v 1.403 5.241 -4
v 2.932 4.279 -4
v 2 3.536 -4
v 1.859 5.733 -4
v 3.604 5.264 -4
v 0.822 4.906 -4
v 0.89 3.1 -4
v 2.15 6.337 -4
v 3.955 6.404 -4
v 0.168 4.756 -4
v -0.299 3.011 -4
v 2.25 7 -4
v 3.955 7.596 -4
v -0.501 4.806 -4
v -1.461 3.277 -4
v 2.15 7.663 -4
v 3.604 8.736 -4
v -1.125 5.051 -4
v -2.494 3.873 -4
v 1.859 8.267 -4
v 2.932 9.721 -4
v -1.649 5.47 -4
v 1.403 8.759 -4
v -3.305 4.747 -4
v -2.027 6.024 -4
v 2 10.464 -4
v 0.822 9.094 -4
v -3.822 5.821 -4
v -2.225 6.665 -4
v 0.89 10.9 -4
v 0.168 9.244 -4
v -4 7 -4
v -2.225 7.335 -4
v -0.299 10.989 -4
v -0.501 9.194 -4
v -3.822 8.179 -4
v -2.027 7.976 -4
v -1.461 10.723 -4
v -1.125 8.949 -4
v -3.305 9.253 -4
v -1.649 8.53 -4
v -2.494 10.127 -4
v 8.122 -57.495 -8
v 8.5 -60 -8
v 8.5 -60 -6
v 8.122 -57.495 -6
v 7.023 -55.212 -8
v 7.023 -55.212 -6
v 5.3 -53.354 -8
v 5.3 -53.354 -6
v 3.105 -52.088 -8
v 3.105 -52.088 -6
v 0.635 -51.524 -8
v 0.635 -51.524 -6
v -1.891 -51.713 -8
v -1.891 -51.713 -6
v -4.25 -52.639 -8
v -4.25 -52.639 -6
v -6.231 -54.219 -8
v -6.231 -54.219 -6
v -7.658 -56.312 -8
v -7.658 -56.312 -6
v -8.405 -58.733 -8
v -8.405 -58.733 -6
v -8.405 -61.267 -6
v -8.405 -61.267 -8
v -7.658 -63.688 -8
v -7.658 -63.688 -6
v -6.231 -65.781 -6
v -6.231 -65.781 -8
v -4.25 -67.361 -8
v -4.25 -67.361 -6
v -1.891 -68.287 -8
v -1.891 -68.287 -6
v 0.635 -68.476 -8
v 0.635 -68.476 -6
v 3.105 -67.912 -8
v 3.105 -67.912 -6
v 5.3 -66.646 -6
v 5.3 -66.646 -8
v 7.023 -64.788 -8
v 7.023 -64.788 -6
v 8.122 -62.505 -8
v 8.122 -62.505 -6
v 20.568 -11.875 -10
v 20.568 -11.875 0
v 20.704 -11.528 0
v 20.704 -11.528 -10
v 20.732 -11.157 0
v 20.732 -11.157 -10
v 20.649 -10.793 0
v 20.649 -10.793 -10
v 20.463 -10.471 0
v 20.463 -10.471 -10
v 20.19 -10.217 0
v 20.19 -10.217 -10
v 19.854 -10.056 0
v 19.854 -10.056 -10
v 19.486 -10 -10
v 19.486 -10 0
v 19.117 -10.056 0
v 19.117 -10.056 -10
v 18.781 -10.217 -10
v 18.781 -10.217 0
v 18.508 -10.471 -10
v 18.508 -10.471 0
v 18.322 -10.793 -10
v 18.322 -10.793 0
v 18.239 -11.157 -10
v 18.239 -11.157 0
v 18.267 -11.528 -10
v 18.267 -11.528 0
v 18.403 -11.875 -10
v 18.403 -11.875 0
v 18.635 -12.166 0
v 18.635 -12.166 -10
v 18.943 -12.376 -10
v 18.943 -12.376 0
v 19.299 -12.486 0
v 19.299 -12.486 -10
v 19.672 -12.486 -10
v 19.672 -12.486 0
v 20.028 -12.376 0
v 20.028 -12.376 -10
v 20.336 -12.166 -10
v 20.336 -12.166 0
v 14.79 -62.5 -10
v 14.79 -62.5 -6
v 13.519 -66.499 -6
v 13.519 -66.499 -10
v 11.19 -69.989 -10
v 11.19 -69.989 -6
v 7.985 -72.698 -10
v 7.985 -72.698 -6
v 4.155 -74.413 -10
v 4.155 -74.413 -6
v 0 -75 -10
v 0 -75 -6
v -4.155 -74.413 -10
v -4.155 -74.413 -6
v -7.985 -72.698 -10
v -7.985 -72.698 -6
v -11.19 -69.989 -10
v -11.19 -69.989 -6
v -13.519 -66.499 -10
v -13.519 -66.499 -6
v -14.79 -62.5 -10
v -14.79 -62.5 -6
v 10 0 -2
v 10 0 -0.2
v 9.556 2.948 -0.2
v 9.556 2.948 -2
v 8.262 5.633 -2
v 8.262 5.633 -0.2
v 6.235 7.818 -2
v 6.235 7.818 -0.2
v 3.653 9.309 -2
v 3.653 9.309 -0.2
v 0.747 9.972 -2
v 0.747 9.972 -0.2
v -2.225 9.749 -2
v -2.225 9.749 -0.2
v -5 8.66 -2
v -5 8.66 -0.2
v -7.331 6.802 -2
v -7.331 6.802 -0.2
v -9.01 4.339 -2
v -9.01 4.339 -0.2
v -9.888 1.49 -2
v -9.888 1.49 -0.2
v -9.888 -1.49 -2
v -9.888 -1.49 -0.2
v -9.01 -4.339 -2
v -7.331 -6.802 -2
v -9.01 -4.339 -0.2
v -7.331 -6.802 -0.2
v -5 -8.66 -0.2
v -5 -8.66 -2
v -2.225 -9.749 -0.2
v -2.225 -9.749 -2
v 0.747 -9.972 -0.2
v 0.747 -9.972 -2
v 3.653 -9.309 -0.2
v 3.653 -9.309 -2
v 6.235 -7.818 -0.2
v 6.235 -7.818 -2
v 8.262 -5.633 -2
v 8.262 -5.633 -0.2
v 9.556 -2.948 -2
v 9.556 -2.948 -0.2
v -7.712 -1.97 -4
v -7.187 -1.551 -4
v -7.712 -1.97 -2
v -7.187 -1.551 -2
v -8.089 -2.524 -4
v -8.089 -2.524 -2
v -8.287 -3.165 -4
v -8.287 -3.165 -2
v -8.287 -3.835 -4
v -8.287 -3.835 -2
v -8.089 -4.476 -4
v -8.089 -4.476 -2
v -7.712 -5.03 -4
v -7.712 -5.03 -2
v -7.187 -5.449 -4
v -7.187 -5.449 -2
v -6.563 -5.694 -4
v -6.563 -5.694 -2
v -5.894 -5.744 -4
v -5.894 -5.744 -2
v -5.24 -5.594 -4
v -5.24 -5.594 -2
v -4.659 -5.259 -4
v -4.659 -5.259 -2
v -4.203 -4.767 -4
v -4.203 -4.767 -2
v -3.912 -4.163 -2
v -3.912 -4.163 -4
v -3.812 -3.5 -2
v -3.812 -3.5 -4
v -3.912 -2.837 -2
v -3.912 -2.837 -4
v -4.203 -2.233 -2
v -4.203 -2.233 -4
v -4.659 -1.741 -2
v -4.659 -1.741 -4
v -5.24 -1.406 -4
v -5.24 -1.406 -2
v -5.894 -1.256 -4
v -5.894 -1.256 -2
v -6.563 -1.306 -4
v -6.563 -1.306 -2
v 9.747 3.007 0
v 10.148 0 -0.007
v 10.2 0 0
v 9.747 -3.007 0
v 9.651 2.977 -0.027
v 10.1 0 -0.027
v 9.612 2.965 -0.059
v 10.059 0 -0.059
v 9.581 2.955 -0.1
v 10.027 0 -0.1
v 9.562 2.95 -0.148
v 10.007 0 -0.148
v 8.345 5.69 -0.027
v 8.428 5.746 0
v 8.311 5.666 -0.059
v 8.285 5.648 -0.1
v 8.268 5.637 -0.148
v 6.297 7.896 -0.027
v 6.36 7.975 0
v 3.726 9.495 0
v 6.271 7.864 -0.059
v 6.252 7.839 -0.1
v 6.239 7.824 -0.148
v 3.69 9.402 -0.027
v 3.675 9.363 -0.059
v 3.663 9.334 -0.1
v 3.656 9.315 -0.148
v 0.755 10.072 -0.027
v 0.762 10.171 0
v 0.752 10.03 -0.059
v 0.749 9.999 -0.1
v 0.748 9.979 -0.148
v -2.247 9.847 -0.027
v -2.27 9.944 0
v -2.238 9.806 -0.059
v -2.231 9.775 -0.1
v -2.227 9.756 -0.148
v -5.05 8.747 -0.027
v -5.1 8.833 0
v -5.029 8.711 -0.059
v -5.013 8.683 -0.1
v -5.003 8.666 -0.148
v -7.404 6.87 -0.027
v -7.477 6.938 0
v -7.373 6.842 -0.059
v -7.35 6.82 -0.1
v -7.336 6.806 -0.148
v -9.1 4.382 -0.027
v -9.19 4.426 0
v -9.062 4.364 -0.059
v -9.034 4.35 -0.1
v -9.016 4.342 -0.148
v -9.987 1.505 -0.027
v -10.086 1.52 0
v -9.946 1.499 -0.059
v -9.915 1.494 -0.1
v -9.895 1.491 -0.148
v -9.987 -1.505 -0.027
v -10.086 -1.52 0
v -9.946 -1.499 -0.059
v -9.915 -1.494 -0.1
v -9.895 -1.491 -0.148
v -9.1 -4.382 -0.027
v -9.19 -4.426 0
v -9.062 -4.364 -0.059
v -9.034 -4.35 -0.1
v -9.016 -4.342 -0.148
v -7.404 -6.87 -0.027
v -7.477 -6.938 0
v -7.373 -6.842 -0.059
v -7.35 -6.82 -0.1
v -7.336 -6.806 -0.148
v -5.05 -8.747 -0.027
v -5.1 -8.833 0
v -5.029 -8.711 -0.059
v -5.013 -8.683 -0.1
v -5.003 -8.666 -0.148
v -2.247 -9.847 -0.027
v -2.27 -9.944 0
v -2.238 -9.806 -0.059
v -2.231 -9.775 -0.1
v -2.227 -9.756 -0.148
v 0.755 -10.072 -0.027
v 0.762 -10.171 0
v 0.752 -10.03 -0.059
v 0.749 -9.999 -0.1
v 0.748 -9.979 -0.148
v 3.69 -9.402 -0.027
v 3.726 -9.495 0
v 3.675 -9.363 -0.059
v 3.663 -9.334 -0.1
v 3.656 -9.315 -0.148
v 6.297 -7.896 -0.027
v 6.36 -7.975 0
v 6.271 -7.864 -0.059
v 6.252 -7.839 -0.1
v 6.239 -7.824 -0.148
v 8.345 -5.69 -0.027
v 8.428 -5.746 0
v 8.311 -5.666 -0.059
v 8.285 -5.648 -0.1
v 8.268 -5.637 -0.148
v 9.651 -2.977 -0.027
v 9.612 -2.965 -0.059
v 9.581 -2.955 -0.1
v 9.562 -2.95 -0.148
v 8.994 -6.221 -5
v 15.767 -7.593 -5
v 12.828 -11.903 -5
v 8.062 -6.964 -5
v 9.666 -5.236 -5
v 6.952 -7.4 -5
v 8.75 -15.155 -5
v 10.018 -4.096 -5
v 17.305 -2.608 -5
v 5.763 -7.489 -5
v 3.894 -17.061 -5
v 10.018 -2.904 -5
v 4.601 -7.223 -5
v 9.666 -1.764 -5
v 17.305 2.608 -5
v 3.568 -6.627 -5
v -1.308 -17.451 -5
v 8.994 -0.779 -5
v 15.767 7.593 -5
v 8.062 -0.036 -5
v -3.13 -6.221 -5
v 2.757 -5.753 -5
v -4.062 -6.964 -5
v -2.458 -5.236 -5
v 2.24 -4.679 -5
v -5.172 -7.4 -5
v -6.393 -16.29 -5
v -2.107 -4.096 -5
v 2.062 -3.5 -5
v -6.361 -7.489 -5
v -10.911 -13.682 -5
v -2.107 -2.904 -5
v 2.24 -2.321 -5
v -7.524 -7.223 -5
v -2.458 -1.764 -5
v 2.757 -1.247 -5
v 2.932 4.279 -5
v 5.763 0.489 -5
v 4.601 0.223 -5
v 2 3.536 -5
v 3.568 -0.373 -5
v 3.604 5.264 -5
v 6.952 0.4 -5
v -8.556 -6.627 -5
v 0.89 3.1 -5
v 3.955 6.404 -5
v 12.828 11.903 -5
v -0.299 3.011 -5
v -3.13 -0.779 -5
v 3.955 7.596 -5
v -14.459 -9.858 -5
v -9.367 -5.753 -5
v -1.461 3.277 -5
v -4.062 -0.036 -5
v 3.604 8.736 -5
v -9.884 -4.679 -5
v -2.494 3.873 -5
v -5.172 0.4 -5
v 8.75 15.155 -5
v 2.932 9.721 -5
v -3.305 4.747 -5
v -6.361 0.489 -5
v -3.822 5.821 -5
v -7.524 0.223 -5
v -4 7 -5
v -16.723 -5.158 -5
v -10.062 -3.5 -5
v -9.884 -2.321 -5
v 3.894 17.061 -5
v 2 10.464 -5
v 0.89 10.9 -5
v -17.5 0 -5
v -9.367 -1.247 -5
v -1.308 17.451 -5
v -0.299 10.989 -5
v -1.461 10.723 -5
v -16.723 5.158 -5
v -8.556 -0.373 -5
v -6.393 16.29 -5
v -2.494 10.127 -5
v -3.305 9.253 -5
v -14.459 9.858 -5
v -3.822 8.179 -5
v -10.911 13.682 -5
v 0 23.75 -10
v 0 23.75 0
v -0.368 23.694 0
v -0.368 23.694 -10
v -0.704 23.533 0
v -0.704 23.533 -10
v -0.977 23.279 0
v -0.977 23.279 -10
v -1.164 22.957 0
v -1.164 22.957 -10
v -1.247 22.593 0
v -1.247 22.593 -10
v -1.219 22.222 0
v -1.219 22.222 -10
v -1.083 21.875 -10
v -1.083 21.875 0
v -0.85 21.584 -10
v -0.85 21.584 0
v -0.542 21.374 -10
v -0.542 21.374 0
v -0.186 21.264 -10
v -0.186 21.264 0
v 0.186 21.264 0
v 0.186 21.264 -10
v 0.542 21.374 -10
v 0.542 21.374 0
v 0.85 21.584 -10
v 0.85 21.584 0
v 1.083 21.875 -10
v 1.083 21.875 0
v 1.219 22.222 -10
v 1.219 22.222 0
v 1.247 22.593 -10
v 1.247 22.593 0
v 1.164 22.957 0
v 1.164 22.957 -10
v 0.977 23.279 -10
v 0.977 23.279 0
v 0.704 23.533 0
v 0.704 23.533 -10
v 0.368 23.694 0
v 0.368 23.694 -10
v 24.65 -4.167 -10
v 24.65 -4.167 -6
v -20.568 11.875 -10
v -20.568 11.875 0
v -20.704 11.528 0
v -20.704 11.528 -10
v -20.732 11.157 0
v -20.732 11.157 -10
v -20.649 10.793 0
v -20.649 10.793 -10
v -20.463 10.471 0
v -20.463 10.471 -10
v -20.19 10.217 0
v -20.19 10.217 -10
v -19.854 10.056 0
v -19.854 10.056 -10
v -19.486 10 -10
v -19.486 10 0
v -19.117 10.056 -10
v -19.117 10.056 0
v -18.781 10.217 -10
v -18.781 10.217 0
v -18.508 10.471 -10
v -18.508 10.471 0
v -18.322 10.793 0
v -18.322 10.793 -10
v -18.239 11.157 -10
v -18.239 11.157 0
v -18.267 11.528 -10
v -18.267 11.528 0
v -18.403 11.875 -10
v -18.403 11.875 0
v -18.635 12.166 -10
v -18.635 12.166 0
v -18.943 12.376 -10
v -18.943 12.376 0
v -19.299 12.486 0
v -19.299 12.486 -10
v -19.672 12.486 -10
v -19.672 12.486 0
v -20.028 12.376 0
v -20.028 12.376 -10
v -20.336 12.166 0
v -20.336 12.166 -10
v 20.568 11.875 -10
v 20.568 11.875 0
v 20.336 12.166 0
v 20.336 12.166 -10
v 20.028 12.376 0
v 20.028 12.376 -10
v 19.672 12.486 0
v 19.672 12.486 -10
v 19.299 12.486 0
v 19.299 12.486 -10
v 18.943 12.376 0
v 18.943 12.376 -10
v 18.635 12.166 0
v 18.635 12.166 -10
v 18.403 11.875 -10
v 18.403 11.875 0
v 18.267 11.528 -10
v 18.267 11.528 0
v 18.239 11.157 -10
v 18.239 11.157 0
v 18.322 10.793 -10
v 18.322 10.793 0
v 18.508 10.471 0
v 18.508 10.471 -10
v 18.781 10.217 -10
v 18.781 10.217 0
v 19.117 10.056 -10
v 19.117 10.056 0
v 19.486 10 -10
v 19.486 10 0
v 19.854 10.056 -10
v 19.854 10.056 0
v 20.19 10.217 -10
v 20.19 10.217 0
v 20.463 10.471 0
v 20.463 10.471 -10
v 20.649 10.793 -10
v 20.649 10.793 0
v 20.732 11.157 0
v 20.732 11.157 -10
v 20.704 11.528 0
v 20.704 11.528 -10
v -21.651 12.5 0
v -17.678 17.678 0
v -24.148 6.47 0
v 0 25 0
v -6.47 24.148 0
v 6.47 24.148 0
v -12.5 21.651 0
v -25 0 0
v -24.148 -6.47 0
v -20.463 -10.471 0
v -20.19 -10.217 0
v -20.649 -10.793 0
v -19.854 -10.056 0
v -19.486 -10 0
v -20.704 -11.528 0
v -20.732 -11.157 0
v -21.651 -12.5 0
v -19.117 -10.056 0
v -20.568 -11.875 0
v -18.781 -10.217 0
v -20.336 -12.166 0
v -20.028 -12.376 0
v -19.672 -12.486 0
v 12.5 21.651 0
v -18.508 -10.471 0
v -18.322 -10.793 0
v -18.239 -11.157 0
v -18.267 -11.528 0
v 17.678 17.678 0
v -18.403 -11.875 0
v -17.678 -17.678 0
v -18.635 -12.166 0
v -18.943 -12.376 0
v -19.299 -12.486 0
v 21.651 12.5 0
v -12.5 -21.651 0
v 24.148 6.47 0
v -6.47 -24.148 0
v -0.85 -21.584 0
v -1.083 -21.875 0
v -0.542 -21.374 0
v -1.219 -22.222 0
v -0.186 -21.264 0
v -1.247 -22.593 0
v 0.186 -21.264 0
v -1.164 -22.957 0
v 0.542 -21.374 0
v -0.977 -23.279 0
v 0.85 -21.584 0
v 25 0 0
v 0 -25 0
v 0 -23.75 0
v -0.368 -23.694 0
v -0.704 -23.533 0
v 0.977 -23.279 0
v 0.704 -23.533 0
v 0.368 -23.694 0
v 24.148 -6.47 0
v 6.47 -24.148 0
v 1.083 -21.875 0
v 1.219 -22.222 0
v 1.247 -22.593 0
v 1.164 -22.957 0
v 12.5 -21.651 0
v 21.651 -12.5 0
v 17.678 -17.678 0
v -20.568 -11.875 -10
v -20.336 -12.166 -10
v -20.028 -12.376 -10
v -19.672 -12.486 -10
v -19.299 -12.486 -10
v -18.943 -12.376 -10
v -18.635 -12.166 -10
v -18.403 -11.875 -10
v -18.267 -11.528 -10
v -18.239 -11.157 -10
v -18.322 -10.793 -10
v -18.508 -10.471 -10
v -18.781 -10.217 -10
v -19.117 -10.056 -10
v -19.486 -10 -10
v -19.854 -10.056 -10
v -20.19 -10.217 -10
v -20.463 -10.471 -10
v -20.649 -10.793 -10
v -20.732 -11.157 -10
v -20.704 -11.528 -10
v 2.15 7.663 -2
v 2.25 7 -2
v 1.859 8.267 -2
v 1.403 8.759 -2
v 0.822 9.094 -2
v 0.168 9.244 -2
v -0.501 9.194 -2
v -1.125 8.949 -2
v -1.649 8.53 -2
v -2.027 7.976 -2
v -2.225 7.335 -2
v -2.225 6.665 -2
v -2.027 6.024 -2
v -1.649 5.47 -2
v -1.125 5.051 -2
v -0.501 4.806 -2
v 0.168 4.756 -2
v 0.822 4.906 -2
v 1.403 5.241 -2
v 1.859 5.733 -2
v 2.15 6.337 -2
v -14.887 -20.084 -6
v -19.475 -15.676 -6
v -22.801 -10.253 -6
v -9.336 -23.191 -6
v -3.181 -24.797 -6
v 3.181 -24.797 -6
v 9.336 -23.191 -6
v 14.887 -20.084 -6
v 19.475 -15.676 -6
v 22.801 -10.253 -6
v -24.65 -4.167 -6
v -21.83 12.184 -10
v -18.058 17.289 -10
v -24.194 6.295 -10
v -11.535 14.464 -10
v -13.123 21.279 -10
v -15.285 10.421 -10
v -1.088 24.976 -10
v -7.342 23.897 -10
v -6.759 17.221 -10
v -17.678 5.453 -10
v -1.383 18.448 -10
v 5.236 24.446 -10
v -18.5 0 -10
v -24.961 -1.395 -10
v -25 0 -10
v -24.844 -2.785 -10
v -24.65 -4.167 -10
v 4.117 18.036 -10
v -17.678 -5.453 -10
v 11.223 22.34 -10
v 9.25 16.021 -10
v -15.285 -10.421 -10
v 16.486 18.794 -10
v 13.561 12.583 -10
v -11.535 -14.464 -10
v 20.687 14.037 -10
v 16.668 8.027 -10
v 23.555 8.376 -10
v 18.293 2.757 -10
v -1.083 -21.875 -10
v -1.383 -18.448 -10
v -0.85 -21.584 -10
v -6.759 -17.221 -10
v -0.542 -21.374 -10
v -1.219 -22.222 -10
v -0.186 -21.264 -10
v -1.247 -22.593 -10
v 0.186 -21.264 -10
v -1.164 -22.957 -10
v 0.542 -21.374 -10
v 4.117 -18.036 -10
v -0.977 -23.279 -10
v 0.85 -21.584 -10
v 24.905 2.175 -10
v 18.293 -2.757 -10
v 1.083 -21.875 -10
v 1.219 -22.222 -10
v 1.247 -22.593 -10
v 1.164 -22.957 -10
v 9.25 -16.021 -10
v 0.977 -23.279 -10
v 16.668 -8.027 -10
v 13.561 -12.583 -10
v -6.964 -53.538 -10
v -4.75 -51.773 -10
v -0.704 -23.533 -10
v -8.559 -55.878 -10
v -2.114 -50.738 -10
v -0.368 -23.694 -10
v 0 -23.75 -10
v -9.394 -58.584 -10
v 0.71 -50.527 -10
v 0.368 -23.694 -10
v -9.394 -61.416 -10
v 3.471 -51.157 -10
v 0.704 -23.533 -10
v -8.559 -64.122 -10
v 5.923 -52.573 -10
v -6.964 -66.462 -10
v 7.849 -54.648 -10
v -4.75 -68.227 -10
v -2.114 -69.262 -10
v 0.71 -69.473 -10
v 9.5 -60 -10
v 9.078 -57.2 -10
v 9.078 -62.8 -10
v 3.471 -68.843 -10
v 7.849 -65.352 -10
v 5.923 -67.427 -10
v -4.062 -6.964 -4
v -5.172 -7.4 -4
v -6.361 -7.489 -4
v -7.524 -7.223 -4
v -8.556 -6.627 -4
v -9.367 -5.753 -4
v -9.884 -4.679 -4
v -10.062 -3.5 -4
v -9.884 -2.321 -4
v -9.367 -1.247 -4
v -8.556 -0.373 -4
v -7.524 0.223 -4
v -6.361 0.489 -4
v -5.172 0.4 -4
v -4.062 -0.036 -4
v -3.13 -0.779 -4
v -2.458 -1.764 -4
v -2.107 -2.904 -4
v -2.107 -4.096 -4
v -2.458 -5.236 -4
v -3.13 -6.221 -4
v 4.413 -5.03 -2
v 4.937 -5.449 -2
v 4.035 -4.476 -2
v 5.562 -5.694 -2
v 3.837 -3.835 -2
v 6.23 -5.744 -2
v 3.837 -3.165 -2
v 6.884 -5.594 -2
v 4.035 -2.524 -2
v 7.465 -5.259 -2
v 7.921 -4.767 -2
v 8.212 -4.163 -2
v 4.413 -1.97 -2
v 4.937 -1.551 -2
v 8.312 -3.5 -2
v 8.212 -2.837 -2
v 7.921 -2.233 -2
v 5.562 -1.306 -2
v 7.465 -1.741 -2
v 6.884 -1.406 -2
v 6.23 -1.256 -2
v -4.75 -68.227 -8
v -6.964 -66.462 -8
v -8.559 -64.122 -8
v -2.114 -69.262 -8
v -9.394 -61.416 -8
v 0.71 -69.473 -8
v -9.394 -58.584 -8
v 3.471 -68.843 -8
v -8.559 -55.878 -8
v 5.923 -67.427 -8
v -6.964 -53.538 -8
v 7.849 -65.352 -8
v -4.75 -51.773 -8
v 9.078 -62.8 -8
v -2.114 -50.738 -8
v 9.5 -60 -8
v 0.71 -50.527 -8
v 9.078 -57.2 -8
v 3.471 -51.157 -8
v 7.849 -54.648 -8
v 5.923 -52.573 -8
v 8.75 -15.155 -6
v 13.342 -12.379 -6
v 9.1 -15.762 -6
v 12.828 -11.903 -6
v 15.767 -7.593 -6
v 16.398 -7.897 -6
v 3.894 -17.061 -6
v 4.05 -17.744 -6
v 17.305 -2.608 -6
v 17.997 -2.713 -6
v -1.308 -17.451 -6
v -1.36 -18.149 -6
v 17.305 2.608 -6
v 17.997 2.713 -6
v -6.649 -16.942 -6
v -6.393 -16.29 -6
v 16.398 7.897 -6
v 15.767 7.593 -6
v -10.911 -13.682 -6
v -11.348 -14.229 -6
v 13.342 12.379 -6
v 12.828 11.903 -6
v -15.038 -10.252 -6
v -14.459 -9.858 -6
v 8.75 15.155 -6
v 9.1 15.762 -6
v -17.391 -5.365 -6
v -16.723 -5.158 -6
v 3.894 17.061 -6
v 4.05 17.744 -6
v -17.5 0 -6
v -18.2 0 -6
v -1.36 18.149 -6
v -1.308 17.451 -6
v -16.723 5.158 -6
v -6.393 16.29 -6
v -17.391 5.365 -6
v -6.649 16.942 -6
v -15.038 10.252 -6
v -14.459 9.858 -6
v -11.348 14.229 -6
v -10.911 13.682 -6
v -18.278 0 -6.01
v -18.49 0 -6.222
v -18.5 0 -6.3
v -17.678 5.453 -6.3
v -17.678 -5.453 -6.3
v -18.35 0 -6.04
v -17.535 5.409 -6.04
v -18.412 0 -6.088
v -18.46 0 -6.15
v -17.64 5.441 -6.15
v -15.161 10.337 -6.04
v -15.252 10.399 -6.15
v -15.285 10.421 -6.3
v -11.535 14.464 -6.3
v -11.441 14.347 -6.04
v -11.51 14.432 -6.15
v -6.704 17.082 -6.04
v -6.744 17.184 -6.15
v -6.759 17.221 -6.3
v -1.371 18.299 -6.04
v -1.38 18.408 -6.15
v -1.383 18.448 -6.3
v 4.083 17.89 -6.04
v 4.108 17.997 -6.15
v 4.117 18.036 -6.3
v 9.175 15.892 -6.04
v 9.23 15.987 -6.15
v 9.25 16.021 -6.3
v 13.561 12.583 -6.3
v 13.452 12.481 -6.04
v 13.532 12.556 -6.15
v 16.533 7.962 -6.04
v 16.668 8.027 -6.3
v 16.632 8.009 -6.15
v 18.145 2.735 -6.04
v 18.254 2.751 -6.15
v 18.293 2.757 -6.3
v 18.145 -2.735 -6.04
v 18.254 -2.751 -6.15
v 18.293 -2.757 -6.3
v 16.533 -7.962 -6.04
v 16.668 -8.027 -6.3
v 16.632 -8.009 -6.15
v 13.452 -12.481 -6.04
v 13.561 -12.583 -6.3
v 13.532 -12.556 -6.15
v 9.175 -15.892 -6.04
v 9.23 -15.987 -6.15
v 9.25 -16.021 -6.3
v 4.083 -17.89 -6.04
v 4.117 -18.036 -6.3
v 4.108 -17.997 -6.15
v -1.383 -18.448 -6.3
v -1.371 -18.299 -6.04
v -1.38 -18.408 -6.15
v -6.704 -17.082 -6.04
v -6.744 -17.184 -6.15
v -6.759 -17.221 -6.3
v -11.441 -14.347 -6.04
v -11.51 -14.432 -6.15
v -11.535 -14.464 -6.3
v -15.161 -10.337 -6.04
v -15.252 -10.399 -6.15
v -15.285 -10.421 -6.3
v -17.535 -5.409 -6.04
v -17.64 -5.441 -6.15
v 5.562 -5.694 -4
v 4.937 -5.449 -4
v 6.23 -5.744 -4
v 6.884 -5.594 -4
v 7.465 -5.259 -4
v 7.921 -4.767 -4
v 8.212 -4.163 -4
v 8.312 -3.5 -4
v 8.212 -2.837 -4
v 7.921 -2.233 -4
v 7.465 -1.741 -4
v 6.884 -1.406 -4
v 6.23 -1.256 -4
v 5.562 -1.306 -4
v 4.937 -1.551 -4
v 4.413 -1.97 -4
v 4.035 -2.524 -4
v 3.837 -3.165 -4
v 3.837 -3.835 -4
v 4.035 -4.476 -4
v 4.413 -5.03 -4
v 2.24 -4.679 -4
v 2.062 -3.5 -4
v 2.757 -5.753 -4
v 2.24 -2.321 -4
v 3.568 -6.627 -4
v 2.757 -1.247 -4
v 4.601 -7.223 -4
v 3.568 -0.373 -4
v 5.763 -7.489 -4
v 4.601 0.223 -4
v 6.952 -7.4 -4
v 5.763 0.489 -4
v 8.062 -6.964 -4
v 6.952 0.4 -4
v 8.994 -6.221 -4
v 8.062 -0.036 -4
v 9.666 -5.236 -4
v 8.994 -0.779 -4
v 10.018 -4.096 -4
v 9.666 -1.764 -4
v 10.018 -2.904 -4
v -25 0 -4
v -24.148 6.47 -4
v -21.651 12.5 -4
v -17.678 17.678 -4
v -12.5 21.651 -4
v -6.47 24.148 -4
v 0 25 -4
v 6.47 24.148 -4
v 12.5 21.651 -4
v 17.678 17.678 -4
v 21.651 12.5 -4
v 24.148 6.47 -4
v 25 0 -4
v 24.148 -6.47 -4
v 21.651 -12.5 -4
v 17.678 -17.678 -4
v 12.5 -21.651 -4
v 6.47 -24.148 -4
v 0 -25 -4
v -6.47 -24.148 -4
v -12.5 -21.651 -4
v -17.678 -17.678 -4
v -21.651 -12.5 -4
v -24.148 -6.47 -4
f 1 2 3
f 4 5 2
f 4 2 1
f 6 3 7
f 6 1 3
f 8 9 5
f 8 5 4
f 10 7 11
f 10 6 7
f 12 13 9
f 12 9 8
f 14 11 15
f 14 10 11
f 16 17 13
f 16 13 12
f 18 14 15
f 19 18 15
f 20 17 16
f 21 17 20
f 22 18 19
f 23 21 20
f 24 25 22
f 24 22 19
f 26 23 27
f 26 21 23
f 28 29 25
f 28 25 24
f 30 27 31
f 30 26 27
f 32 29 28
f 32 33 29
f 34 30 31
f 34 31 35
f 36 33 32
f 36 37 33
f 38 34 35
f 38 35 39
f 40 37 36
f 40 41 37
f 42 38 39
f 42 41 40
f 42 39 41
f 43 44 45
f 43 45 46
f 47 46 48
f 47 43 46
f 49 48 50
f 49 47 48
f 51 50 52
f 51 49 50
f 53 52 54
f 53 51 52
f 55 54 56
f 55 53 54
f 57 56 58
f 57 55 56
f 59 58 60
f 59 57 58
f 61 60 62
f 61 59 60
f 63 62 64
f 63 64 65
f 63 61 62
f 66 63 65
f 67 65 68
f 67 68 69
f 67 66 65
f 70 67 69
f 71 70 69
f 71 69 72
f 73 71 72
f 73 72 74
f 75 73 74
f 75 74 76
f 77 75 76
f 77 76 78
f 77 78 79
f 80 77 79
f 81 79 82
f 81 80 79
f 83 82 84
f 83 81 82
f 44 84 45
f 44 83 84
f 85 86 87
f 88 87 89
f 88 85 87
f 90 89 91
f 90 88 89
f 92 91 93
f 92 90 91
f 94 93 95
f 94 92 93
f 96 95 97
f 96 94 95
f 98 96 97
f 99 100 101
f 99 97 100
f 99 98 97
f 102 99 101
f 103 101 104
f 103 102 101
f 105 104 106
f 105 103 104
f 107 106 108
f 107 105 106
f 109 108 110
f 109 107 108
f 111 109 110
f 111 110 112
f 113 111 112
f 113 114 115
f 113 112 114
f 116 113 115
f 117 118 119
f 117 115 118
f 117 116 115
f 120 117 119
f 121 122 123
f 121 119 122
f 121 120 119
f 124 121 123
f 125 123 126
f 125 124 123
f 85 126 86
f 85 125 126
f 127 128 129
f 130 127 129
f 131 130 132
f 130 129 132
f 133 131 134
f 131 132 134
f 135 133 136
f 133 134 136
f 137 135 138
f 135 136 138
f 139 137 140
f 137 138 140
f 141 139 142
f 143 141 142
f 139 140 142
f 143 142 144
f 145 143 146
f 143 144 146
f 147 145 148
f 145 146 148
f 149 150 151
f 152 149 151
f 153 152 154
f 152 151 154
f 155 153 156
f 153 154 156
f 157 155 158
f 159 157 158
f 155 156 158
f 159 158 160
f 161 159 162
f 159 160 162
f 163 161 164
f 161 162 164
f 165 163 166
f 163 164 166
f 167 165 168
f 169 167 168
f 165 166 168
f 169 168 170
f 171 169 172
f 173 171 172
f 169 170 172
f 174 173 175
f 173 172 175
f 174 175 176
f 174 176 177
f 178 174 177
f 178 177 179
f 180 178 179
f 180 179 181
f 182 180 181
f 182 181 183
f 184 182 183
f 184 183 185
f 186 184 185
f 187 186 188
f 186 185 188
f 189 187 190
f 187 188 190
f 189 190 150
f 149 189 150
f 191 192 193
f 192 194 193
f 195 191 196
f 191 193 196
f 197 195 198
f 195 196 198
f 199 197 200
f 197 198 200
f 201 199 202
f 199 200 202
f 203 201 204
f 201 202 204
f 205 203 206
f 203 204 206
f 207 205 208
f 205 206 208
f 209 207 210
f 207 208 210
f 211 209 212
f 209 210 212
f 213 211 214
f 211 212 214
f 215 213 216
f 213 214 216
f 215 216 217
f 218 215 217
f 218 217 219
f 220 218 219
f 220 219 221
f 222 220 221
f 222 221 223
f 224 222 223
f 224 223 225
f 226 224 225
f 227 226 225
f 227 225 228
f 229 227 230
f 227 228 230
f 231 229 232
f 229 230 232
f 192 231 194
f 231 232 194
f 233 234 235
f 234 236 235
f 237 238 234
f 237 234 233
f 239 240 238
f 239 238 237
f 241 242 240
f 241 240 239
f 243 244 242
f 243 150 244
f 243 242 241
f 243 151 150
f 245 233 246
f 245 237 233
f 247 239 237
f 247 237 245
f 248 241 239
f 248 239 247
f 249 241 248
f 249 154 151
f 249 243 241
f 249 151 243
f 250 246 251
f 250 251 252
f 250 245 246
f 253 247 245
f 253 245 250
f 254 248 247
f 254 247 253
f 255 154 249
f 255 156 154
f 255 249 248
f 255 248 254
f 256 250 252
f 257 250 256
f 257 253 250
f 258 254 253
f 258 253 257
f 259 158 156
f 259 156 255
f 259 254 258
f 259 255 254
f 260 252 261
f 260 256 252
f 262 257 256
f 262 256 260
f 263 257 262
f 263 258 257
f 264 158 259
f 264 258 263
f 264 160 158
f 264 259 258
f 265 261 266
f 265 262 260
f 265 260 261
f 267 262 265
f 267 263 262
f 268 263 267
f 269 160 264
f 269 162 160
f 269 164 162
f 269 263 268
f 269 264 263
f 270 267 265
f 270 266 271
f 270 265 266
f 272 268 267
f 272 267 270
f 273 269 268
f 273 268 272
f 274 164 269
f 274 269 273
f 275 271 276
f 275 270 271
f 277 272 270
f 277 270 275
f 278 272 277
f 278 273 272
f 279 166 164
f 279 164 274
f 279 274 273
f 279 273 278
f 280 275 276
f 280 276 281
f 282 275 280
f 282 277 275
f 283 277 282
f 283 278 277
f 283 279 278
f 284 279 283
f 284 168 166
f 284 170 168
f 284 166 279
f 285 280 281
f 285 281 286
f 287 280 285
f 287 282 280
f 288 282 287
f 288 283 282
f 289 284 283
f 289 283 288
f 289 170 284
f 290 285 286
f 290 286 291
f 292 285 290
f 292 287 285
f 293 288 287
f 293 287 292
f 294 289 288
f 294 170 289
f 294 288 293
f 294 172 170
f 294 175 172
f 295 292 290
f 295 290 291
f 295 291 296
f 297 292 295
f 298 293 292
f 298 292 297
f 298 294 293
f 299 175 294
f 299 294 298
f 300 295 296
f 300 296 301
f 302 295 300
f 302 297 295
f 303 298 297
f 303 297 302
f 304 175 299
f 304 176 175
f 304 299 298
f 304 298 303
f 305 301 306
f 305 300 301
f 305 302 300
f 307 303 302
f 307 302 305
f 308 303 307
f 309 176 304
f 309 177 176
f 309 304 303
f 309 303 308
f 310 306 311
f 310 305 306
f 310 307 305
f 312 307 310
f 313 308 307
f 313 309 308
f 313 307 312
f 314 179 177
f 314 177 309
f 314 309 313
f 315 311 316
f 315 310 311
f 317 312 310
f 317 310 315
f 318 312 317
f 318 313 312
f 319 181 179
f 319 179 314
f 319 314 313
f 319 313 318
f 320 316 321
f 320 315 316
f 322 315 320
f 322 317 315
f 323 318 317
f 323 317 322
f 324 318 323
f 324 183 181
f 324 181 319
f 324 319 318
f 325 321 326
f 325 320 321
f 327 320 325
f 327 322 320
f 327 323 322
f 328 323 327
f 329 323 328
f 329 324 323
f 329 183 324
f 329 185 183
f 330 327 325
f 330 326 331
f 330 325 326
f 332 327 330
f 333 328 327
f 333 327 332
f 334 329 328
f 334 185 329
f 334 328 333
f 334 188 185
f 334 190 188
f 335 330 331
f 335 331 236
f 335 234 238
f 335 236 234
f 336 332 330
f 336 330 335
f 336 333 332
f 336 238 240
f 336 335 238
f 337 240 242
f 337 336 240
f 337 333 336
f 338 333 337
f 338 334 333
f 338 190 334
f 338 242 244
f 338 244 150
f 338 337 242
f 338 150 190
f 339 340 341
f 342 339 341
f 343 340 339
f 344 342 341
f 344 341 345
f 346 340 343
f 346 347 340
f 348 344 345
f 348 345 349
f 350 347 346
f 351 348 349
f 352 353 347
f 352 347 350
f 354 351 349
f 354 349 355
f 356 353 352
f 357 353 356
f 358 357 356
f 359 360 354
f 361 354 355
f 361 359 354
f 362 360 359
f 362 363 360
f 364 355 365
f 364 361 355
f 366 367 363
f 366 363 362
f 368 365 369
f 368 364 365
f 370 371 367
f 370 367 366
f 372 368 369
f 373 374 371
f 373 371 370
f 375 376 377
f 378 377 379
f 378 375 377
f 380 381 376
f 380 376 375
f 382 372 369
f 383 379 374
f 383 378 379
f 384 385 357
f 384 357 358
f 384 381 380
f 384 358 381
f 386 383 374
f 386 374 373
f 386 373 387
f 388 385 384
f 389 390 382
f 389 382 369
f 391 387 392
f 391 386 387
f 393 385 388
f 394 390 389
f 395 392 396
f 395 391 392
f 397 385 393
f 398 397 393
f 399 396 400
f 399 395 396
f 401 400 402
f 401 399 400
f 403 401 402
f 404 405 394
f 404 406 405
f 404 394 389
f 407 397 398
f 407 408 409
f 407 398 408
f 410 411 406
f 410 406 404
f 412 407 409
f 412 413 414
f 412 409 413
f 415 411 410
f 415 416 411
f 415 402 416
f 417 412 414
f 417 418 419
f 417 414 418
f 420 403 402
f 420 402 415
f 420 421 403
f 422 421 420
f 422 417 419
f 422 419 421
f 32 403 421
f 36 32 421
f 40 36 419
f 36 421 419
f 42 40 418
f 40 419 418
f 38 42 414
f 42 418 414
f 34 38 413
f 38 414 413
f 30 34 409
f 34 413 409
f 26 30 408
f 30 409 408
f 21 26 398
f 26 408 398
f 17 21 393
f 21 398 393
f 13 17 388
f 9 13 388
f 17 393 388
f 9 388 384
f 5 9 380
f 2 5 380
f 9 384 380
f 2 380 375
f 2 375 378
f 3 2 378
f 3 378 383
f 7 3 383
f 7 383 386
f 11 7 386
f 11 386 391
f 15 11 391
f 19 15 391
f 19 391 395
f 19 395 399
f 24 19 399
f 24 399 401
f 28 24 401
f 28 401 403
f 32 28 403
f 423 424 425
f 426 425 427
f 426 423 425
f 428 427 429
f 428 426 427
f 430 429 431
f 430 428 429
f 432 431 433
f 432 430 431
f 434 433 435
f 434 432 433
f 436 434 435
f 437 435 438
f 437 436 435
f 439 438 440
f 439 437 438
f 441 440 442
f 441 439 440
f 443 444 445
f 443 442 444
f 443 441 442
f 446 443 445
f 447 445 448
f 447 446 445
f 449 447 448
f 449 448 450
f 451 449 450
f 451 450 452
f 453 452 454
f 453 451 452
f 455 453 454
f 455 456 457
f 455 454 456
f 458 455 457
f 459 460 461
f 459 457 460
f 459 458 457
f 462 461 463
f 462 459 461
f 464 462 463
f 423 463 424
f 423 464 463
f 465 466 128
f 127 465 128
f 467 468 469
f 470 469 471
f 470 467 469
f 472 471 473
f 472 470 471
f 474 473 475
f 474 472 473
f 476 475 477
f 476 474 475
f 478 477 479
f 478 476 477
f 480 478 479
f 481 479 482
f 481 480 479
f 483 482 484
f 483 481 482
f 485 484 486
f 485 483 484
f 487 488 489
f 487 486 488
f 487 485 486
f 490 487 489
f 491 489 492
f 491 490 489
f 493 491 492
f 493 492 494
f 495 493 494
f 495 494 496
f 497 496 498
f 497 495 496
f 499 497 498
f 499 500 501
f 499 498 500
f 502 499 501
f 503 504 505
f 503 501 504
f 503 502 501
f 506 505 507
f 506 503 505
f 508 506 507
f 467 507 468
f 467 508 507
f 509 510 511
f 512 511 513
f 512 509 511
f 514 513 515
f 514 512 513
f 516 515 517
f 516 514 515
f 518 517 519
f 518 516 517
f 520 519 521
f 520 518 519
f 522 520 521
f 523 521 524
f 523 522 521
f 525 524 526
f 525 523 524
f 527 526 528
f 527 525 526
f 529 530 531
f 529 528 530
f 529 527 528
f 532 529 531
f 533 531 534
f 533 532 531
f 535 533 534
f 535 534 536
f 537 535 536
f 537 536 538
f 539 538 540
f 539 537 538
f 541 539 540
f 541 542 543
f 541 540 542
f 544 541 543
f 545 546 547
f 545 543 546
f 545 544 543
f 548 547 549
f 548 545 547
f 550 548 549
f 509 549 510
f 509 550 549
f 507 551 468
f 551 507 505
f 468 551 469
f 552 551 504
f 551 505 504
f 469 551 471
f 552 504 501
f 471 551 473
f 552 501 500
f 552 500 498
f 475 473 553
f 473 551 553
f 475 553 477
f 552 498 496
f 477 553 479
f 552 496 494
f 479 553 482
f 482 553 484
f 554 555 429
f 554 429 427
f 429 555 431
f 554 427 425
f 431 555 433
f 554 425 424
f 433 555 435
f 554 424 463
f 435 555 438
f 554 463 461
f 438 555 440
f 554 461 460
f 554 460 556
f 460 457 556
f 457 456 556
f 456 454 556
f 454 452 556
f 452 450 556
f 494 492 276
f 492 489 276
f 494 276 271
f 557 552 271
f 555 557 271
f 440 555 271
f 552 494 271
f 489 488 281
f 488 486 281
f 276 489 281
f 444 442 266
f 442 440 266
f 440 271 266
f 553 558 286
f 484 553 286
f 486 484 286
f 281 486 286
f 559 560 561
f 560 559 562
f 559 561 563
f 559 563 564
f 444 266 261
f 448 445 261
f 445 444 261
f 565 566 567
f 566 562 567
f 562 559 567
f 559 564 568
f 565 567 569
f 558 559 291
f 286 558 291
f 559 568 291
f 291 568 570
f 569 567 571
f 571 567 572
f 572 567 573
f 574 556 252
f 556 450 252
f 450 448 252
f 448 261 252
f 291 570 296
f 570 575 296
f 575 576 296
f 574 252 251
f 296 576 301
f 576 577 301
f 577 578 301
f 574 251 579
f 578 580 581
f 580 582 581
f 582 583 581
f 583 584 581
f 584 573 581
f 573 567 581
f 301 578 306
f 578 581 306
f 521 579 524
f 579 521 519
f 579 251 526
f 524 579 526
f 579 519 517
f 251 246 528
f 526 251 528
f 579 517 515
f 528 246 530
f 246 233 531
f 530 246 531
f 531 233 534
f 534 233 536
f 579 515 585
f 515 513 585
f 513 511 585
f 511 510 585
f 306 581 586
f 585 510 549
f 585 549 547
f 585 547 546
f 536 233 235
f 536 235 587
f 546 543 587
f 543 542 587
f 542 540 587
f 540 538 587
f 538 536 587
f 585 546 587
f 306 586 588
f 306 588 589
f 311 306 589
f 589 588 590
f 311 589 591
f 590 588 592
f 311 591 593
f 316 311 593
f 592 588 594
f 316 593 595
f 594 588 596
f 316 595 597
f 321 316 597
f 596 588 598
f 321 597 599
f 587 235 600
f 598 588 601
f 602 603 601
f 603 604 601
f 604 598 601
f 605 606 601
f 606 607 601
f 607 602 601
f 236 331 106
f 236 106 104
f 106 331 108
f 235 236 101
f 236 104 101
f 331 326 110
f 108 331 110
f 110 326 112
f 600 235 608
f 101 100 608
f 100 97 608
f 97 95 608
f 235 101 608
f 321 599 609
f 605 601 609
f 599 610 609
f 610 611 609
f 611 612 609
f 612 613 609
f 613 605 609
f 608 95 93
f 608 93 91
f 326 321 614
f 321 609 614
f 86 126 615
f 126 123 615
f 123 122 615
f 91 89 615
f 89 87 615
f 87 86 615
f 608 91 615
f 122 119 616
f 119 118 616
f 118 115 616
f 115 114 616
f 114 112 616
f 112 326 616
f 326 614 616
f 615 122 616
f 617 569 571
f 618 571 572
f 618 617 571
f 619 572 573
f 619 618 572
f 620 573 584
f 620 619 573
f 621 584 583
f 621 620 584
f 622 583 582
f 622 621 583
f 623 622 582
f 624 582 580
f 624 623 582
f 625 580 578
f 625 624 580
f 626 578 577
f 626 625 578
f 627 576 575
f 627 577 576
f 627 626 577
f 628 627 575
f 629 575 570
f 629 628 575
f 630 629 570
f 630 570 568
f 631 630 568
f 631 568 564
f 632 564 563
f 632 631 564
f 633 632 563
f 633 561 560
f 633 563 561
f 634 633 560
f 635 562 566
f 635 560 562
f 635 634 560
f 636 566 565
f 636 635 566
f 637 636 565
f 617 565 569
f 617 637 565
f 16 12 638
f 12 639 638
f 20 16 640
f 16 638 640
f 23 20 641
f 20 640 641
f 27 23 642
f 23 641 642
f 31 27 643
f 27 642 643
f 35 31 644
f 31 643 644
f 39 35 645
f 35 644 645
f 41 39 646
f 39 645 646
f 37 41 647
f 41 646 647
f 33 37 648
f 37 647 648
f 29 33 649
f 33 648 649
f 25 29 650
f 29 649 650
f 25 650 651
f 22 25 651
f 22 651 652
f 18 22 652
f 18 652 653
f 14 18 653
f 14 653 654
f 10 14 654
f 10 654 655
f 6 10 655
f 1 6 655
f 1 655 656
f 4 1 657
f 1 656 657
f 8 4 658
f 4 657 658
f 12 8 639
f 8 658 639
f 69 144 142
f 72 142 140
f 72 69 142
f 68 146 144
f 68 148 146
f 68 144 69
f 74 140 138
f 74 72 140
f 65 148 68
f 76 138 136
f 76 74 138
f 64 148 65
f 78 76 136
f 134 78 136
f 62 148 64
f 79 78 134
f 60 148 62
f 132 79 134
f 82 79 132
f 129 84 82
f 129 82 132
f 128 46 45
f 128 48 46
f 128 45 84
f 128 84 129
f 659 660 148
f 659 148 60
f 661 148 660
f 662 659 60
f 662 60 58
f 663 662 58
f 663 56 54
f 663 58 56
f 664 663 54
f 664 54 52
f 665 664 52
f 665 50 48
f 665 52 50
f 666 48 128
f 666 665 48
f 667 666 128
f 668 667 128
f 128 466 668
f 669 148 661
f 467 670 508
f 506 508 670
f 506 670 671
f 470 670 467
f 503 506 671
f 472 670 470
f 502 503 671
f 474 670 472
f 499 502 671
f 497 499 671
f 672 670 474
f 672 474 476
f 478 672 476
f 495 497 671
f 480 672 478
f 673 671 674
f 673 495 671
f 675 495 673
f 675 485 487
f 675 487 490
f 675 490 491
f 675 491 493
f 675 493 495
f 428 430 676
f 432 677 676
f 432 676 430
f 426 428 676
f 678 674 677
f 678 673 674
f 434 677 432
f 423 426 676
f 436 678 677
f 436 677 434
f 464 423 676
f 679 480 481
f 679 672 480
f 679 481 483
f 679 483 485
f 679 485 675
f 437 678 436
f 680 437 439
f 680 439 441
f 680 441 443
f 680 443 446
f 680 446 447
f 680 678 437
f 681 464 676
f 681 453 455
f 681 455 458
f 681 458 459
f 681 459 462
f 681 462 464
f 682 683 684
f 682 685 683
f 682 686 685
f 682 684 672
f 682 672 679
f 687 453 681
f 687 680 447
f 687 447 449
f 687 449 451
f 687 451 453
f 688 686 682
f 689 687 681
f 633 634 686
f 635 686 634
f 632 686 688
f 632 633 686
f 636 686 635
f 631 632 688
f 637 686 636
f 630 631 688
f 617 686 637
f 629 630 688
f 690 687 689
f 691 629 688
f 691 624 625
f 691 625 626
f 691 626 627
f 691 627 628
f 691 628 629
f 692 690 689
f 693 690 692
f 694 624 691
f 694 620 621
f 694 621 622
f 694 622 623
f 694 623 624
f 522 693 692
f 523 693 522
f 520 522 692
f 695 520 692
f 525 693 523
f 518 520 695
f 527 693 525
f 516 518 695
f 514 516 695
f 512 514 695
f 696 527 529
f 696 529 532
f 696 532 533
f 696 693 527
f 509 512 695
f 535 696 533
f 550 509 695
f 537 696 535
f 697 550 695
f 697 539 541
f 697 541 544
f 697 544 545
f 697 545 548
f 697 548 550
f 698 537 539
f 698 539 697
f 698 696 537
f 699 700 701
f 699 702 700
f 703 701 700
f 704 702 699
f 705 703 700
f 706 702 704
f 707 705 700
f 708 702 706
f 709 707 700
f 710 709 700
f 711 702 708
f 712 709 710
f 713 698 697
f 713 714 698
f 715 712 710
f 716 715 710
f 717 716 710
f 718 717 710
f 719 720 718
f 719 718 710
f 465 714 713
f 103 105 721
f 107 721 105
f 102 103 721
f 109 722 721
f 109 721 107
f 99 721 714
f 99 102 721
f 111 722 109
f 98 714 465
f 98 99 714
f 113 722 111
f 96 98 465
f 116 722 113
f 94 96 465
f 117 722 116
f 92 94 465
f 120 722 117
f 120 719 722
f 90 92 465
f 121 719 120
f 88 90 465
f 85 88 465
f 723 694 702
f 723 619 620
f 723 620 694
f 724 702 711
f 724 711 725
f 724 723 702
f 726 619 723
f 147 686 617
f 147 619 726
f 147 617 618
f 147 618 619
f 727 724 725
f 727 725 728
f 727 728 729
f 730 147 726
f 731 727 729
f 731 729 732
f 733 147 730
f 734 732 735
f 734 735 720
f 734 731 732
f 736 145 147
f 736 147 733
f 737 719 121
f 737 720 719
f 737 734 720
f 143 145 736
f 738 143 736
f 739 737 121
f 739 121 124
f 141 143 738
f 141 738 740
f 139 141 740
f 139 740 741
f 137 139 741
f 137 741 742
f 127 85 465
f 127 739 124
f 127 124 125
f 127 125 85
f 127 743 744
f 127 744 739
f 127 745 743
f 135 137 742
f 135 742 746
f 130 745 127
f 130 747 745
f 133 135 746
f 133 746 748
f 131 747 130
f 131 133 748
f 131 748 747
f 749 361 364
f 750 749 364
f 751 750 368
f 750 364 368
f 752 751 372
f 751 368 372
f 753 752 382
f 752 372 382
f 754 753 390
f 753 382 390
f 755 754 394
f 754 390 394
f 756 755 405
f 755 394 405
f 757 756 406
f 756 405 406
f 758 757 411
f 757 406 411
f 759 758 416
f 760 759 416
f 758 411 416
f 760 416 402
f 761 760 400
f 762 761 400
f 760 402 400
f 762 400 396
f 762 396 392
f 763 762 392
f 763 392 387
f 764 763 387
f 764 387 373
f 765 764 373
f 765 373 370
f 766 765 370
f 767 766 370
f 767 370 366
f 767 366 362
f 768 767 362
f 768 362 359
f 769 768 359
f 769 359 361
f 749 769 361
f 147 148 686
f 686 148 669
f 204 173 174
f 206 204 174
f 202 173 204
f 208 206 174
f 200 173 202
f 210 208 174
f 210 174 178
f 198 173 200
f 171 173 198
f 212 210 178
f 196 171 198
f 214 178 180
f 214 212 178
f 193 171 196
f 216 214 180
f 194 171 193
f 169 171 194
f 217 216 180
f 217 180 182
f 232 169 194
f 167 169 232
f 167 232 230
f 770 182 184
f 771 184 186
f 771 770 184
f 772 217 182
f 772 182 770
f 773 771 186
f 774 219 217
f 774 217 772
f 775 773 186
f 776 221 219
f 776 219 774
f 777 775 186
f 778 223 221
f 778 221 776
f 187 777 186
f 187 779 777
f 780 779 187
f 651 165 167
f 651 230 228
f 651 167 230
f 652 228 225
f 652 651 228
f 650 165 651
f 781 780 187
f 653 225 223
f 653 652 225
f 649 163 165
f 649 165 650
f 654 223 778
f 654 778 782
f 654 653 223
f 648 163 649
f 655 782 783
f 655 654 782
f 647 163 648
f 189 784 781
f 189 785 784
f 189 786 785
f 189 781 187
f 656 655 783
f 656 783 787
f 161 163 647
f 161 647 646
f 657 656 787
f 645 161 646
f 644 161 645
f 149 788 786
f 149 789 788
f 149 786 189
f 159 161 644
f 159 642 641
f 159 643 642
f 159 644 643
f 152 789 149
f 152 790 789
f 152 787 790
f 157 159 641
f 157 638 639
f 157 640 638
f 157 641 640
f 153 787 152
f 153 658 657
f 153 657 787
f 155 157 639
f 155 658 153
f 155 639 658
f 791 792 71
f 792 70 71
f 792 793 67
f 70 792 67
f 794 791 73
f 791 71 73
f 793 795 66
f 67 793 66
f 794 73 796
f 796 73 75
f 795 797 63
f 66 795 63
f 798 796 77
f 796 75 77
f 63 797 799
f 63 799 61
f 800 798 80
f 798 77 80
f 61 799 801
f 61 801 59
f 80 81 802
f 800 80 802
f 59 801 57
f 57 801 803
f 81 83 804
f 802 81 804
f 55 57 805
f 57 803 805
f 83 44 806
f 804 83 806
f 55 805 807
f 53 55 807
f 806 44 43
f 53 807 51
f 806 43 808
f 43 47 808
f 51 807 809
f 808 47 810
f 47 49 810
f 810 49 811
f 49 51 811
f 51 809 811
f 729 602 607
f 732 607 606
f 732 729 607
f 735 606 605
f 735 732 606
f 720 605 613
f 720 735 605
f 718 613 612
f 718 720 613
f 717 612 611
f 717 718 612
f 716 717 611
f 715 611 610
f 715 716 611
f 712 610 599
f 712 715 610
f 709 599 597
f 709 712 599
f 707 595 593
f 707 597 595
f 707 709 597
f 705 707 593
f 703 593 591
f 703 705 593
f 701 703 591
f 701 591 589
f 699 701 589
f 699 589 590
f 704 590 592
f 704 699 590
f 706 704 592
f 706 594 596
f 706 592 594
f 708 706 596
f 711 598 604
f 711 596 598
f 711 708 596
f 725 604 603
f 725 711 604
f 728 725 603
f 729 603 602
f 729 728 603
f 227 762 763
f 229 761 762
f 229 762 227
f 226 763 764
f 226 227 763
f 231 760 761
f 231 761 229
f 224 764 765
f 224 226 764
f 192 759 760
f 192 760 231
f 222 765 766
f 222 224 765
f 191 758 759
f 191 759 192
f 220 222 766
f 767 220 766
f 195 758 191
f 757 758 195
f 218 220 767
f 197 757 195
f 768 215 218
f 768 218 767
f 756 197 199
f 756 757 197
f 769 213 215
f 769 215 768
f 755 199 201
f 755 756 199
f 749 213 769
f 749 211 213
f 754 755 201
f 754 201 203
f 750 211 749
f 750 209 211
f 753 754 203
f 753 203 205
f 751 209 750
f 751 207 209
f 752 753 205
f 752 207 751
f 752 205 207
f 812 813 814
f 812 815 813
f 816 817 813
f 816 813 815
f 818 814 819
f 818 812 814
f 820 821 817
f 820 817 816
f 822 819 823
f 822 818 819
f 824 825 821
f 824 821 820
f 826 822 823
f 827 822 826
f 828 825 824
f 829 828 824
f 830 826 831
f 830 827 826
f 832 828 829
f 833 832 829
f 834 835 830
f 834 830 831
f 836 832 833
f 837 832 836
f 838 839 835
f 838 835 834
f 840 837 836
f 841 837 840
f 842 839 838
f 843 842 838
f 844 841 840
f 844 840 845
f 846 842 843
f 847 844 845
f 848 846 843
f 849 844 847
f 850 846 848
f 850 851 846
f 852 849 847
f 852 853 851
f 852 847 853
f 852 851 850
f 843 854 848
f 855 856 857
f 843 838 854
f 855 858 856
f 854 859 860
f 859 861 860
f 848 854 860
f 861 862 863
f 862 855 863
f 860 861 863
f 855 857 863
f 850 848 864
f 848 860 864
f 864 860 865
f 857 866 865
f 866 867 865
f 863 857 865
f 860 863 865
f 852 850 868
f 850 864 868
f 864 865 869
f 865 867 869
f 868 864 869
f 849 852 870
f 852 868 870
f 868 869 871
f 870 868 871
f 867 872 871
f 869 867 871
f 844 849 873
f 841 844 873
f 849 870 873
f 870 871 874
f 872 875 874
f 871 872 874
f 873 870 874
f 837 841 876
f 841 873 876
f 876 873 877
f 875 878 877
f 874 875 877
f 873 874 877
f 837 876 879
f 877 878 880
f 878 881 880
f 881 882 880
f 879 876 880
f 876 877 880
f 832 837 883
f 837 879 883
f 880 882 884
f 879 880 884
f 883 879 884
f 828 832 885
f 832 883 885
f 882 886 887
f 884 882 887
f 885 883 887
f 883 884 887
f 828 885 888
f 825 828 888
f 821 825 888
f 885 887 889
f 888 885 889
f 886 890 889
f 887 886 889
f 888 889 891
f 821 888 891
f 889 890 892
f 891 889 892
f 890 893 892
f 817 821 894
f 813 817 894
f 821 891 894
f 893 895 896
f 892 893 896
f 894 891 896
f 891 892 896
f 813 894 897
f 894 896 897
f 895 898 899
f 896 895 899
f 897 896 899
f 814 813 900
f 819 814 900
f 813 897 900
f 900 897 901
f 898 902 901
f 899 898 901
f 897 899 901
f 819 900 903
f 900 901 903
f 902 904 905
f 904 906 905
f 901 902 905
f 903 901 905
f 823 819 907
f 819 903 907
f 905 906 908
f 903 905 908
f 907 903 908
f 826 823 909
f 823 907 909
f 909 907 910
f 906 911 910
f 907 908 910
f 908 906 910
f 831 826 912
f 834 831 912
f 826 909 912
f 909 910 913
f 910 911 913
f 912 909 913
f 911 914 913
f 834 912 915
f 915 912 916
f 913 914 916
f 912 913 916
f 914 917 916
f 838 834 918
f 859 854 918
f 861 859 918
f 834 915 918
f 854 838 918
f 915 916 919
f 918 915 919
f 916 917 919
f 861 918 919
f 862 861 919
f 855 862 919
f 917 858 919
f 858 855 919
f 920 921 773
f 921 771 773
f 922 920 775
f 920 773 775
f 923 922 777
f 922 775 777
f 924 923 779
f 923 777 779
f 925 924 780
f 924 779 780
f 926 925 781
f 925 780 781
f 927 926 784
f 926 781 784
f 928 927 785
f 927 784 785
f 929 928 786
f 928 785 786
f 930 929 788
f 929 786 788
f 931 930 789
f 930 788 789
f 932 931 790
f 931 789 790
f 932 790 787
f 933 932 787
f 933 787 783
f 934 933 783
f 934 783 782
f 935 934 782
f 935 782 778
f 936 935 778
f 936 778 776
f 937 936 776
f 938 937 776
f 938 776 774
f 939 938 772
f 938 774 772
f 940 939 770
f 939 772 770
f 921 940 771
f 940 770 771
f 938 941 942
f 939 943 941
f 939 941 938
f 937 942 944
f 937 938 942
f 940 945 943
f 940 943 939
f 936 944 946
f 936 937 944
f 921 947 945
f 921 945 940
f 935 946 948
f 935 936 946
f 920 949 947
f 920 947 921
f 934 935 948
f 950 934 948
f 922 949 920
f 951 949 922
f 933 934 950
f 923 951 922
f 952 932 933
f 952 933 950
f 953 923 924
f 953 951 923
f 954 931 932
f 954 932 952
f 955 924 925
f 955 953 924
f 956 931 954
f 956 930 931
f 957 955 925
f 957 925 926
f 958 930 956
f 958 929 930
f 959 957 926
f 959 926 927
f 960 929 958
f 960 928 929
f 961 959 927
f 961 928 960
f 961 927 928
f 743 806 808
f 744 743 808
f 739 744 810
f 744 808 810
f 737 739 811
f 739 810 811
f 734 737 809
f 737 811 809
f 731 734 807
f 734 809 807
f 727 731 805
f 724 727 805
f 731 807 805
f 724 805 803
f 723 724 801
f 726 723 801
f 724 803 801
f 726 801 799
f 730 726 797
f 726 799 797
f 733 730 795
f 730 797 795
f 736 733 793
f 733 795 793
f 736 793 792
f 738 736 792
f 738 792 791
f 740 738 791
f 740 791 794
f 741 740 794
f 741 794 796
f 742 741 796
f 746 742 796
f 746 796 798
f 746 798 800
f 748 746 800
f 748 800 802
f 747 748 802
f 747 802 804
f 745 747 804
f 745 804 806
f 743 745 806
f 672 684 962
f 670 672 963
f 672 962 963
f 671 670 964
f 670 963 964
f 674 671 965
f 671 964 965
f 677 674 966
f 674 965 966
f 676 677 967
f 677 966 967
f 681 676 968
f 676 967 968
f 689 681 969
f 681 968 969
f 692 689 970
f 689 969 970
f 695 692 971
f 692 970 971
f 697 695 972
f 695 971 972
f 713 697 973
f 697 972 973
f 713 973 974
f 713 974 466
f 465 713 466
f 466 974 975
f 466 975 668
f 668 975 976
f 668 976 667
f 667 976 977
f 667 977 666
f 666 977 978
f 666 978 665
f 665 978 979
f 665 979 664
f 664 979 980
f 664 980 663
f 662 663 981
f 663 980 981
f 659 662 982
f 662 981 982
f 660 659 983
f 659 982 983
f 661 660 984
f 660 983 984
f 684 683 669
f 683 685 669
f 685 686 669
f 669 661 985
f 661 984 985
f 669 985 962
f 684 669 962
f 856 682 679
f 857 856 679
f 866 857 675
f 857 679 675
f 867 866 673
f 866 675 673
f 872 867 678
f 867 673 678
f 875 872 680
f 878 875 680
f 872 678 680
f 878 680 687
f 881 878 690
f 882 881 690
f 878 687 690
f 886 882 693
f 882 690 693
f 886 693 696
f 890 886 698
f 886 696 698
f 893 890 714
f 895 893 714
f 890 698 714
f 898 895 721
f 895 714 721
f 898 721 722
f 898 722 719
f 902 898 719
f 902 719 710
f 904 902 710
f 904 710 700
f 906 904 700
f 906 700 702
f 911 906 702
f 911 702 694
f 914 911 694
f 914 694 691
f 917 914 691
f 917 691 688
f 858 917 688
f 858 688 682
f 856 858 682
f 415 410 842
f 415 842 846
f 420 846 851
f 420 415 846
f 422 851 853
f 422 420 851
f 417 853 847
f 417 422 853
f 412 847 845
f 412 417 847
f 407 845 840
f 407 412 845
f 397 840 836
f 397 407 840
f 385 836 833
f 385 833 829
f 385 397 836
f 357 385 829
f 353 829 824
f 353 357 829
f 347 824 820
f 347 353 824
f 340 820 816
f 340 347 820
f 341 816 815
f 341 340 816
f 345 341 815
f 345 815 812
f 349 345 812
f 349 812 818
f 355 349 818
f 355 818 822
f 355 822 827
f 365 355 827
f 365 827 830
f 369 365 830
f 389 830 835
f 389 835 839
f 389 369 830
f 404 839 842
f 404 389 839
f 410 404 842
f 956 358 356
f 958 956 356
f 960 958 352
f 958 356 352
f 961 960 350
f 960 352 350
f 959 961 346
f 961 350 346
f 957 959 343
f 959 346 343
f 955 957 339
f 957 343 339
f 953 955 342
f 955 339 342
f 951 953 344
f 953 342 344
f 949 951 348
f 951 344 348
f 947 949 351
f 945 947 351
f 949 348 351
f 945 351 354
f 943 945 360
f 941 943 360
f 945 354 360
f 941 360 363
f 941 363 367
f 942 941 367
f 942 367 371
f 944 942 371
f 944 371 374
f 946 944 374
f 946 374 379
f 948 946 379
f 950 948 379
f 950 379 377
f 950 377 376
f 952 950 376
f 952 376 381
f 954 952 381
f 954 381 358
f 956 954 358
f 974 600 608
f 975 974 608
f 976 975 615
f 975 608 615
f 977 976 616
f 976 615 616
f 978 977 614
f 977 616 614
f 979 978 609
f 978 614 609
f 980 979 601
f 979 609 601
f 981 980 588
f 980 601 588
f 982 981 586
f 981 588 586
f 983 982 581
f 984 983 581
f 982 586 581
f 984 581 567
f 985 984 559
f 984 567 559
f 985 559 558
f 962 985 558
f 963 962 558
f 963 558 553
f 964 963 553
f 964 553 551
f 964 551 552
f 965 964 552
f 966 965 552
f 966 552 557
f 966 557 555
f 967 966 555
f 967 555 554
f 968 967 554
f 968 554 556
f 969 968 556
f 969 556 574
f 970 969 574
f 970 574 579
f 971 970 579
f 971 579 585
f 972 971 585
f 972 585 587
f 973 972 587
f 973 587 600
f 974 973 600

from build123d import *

# Parameters (mm, degrees)
SKETCH_2_R                   = 25
EXTRUDE_2_DEPTH              = 4
SKETCH_22_R                  = 10
CUT_EXTRUDE_1_DEPTH          = 2
FILLET_4_R                   = 0.2
SKETCH_54_R                  = 25
EXTRUDE_6_DEPTH              = 11
SKETCH_55_R                  = 18.5
CUT_EXTRUDE_2_DEPTH          = 10
HOLE_WIZARD_M4_1_D           = 4.5
HOLE_WIZARD_M4_1_CBORE_D     = 8
HOLE_WIZARD_M4_1_CBORE_DEPTH = 1
PATTERN_CIRCULAR_1_COUNT     = 3
SKETCH_59_R                  = 18.5
SKETCH_59_R_2                = 17.5
EXTRUDE_7_DEPTH              = 1
EXTRUDE_START                = -9
EXTRUDE_8_DEPTH              = 9
FILLET_6_R                   = 0.3
SKETCH_68_R                  = 9.5
CUT_EXTRUDE_7_DEPTH          = 7
SKETCH_69_R                  = 8.5
CUT_EXTRUDE_8_DEPTH          = 2
CUT_EXTRUDE_START            = -75
SKETCH_80_W                  = 72.028937147
SKETCH_80_H                  = 9.617570508
CUT_EXTRUDE_9_DEPTH          = 100
EXTRUDE_START_2              = -2
SKETCH_82_R                  = 9.5
SKETCH_82_R_2                = 8.5
EXTRUDE_9_DEPTH              = 2
PATTERN_CIRCULAR_2_COUNT     = 6


with BuildPart() as part:
    # Sketch 2 → Extrude 2 (new body)
    with BuildSketch(Plane(origin=(0, 6, 0), x_dir=(1, 0, 0), z_dir=(0, 0, -1))):
        with Locations((0, 6)):
            Circle(SKETCH_2_R)
    extrude(amount=EXTRUDE_2_DEPTH)

    # Sketch 22 → Cut-Extrude 1 (cut)
    with BuildSketch(Plane.XY):
        Circle(SKETCH_22_R)
    extrude(amount=-CUT_EXTRUDE_1_DEPTH, mode=Mode.SUBTRACT)

    # Fillet 4
    fillet_4_edges = [part.edges().sort_by_distance(p)[0] for p in [
        (-10, 0, 0),
    ]]
    fillet(fillet_4_edges, radius=FILLET_4_R)

    # Sketch 54 → Extrude 6 (add)
    with BuildSketch(Plane(origin=(0, 0, -4), x_dir=(-1, 0, 0), z_dir=(0, 0, -1))):
        Circle(SKETCH_54_R)
    extrude(amount=EXTRUDE_6_DEPTH)

    # Sketch 55 → Cut-Extrude 2 (cut)
    with BuildSketch(Plane(origin=(0, 0, -15), x_dir=(-1, 0, 0), z_dir=(0, 0, -1))):
        Circle(SKETCH_55_R)
    extrude(amount=-CUT_EXTRUDE_2_DEPTH, mode=Mode.SUBTRACT)

    # Hole Wizard M4 _ _ _ _ _ _1 (through all)
    with Locations(Plane(origin=(0, 0, -5), x_dir=(-1, 0, 0), z_dir=(0, 0, -1))):
        with Locations((0, 7)):
            hole_wizard_m4_1 = CounterBoreHole(HOLE_WIZARD_M4_1_D / 2, HOLE_WIZARD_M4_1_CBORE_D / 2, HOLE_WIZARD_M4_1_CBORE_DEPTH)

    # Pattern Circular 1: Hole Wizard M4 _ _ _ _ _ _1 ×3 about axis
    pattern_circular_1_axis = Axis((0, 0, 0), (0, 0, 1))
    for i in range(1, PATTERN_CIRCULAR_1_COUNT):
        add(hole_wizard_m4_1.rotate(pattern_circular_1_axis, i * 360 / PATTERN_CIRCULAR_1_COUNT), mode=Mode.SUBTRACT)

    # Sketch 59 → Extrude 7 (add)
    with BuildSketch(Plane(origin=(0, 0, -5), x_dir=(-1, 0, 0), z_dir=(0, 0, -1))):
        Circle(SKETCH_59_R)
        Circle(SKETCH_59_R_2, mode=Mode.SUBTRACT)
    extrude(amount=EXTRUDE_7_DEPTH)

    # Sketch 60 → Extrude 8 (add)
    with BuildSketch(Plane(origin=(0, 0, -15), x_dir=(-1, 0, 0), z_dir=(0, 0, -1)).offset(EXTRUDE_START)):
        with BuildLine():
            Line((-24.65033243, -4.166666667), (-14.790199458, -62.5))
            ThreePointArc((-14.790199458, -62.5), (0, -75), (14.790199458, -62.5))
            Line((14.790199458, -62.5), (24.65033243, -4.166666667))
            ThreePointArc((24.65033243, -4.166666667), (0, -25), (-24.65033243, -4.166666667))
        make_face()
    extrude(amount=EXTRUDE_8_DEPTH)

    # Fillet 6
    fillet_6_edges = [part.edges().sort_by_distance(p)[0] for p in [
        (18.5, 0, -6),
    ]]
    fillet(fillet_6_edges, radius=FILLET_6_R)

    # Sketch 68 → Cut-Extrude 7 (cut)
    with BuildSketch(Plane.XY.offset(-6)):
        with Locations((0, -60)):
            Circle(SKETCH_68_R)
    extrude(amount=-CUT_EXTRUDE_7_DEPTH, mode=Mode.SUBTRACT)

    # Sketch 69 → Cut-Extrude 8 (cut)
    with BuildSketch(Plane.XY.offset(-13)):
        with Locations((0, -60)):
            Circle(SKETCH_69_R)
    extrude(amount=-CUT_EXTRUDE_8_DEPTH, mode=Mode.SUBTRACT)

    # Sketch 80 → Cut-Extrude 9 (cut)
    with BuildSketch(Plane(origin=(0, 0, 0), x_dir=(1, 0, 0), z_dir=(0, 1, 0)).offset(CUT_EXTRUDE_START)):
        with Locations((0.446829634, 14.808785254)):
            Rectangle(SKETCH_80_W, SKETCH_80_H)
    extrude(amount=CUT_EXTRUDE_9_DEPTH, mode=Mode.SUBTRACT)

    # Sketch 82 → Extrude 9 (add)
    with BuildSketch(Plane.XY.offset(-6).offset(EXTRUDE_START_2)):
        with Locations((0, -60)):
            Circle(SKETCH_82_R)
        with Locations((0, -60)):
            Circle(SKETCH_82_R_2, mode=Mode.SUBTRACT)
    extrude(amount=EXTRUDE_9_DEPTH)

    # Sketch 87 → Hole Wizard M3 _ _ _ _1 (revolve, cut)
    with BuildSketch(Plane(origin=(0, 22.5, -10), x_dir=(0, 1, 0), z_dir=(1, 0, 0))):
        Polygon((0, 0), (0, 222.751075774), (1.25, 222), (1.25, 0), align=None)
    hole_wizard_m3_1 = revolve(axis=Axis((0, 22.5, -16.35), (0, 0, 1)), mode=Mode.SUBTRACT)

    # Pattern Circular 2: Hole Wizard M3 _ _ _ _1 ×6 about axis
    pattern_circular_2_axis = Axis((0, 0, 0), (0, 0, 1))
    for i in range(1, PATTERN_CIRCULAR_2_COUNT):
        add(hole_wizard_m3_1.rotate(pattern_circular_2_axis, i * 360 / PATTERN_CIRCULAR_2_COUNT), mode=Mode.SUBTRACT)


solid = part.part
